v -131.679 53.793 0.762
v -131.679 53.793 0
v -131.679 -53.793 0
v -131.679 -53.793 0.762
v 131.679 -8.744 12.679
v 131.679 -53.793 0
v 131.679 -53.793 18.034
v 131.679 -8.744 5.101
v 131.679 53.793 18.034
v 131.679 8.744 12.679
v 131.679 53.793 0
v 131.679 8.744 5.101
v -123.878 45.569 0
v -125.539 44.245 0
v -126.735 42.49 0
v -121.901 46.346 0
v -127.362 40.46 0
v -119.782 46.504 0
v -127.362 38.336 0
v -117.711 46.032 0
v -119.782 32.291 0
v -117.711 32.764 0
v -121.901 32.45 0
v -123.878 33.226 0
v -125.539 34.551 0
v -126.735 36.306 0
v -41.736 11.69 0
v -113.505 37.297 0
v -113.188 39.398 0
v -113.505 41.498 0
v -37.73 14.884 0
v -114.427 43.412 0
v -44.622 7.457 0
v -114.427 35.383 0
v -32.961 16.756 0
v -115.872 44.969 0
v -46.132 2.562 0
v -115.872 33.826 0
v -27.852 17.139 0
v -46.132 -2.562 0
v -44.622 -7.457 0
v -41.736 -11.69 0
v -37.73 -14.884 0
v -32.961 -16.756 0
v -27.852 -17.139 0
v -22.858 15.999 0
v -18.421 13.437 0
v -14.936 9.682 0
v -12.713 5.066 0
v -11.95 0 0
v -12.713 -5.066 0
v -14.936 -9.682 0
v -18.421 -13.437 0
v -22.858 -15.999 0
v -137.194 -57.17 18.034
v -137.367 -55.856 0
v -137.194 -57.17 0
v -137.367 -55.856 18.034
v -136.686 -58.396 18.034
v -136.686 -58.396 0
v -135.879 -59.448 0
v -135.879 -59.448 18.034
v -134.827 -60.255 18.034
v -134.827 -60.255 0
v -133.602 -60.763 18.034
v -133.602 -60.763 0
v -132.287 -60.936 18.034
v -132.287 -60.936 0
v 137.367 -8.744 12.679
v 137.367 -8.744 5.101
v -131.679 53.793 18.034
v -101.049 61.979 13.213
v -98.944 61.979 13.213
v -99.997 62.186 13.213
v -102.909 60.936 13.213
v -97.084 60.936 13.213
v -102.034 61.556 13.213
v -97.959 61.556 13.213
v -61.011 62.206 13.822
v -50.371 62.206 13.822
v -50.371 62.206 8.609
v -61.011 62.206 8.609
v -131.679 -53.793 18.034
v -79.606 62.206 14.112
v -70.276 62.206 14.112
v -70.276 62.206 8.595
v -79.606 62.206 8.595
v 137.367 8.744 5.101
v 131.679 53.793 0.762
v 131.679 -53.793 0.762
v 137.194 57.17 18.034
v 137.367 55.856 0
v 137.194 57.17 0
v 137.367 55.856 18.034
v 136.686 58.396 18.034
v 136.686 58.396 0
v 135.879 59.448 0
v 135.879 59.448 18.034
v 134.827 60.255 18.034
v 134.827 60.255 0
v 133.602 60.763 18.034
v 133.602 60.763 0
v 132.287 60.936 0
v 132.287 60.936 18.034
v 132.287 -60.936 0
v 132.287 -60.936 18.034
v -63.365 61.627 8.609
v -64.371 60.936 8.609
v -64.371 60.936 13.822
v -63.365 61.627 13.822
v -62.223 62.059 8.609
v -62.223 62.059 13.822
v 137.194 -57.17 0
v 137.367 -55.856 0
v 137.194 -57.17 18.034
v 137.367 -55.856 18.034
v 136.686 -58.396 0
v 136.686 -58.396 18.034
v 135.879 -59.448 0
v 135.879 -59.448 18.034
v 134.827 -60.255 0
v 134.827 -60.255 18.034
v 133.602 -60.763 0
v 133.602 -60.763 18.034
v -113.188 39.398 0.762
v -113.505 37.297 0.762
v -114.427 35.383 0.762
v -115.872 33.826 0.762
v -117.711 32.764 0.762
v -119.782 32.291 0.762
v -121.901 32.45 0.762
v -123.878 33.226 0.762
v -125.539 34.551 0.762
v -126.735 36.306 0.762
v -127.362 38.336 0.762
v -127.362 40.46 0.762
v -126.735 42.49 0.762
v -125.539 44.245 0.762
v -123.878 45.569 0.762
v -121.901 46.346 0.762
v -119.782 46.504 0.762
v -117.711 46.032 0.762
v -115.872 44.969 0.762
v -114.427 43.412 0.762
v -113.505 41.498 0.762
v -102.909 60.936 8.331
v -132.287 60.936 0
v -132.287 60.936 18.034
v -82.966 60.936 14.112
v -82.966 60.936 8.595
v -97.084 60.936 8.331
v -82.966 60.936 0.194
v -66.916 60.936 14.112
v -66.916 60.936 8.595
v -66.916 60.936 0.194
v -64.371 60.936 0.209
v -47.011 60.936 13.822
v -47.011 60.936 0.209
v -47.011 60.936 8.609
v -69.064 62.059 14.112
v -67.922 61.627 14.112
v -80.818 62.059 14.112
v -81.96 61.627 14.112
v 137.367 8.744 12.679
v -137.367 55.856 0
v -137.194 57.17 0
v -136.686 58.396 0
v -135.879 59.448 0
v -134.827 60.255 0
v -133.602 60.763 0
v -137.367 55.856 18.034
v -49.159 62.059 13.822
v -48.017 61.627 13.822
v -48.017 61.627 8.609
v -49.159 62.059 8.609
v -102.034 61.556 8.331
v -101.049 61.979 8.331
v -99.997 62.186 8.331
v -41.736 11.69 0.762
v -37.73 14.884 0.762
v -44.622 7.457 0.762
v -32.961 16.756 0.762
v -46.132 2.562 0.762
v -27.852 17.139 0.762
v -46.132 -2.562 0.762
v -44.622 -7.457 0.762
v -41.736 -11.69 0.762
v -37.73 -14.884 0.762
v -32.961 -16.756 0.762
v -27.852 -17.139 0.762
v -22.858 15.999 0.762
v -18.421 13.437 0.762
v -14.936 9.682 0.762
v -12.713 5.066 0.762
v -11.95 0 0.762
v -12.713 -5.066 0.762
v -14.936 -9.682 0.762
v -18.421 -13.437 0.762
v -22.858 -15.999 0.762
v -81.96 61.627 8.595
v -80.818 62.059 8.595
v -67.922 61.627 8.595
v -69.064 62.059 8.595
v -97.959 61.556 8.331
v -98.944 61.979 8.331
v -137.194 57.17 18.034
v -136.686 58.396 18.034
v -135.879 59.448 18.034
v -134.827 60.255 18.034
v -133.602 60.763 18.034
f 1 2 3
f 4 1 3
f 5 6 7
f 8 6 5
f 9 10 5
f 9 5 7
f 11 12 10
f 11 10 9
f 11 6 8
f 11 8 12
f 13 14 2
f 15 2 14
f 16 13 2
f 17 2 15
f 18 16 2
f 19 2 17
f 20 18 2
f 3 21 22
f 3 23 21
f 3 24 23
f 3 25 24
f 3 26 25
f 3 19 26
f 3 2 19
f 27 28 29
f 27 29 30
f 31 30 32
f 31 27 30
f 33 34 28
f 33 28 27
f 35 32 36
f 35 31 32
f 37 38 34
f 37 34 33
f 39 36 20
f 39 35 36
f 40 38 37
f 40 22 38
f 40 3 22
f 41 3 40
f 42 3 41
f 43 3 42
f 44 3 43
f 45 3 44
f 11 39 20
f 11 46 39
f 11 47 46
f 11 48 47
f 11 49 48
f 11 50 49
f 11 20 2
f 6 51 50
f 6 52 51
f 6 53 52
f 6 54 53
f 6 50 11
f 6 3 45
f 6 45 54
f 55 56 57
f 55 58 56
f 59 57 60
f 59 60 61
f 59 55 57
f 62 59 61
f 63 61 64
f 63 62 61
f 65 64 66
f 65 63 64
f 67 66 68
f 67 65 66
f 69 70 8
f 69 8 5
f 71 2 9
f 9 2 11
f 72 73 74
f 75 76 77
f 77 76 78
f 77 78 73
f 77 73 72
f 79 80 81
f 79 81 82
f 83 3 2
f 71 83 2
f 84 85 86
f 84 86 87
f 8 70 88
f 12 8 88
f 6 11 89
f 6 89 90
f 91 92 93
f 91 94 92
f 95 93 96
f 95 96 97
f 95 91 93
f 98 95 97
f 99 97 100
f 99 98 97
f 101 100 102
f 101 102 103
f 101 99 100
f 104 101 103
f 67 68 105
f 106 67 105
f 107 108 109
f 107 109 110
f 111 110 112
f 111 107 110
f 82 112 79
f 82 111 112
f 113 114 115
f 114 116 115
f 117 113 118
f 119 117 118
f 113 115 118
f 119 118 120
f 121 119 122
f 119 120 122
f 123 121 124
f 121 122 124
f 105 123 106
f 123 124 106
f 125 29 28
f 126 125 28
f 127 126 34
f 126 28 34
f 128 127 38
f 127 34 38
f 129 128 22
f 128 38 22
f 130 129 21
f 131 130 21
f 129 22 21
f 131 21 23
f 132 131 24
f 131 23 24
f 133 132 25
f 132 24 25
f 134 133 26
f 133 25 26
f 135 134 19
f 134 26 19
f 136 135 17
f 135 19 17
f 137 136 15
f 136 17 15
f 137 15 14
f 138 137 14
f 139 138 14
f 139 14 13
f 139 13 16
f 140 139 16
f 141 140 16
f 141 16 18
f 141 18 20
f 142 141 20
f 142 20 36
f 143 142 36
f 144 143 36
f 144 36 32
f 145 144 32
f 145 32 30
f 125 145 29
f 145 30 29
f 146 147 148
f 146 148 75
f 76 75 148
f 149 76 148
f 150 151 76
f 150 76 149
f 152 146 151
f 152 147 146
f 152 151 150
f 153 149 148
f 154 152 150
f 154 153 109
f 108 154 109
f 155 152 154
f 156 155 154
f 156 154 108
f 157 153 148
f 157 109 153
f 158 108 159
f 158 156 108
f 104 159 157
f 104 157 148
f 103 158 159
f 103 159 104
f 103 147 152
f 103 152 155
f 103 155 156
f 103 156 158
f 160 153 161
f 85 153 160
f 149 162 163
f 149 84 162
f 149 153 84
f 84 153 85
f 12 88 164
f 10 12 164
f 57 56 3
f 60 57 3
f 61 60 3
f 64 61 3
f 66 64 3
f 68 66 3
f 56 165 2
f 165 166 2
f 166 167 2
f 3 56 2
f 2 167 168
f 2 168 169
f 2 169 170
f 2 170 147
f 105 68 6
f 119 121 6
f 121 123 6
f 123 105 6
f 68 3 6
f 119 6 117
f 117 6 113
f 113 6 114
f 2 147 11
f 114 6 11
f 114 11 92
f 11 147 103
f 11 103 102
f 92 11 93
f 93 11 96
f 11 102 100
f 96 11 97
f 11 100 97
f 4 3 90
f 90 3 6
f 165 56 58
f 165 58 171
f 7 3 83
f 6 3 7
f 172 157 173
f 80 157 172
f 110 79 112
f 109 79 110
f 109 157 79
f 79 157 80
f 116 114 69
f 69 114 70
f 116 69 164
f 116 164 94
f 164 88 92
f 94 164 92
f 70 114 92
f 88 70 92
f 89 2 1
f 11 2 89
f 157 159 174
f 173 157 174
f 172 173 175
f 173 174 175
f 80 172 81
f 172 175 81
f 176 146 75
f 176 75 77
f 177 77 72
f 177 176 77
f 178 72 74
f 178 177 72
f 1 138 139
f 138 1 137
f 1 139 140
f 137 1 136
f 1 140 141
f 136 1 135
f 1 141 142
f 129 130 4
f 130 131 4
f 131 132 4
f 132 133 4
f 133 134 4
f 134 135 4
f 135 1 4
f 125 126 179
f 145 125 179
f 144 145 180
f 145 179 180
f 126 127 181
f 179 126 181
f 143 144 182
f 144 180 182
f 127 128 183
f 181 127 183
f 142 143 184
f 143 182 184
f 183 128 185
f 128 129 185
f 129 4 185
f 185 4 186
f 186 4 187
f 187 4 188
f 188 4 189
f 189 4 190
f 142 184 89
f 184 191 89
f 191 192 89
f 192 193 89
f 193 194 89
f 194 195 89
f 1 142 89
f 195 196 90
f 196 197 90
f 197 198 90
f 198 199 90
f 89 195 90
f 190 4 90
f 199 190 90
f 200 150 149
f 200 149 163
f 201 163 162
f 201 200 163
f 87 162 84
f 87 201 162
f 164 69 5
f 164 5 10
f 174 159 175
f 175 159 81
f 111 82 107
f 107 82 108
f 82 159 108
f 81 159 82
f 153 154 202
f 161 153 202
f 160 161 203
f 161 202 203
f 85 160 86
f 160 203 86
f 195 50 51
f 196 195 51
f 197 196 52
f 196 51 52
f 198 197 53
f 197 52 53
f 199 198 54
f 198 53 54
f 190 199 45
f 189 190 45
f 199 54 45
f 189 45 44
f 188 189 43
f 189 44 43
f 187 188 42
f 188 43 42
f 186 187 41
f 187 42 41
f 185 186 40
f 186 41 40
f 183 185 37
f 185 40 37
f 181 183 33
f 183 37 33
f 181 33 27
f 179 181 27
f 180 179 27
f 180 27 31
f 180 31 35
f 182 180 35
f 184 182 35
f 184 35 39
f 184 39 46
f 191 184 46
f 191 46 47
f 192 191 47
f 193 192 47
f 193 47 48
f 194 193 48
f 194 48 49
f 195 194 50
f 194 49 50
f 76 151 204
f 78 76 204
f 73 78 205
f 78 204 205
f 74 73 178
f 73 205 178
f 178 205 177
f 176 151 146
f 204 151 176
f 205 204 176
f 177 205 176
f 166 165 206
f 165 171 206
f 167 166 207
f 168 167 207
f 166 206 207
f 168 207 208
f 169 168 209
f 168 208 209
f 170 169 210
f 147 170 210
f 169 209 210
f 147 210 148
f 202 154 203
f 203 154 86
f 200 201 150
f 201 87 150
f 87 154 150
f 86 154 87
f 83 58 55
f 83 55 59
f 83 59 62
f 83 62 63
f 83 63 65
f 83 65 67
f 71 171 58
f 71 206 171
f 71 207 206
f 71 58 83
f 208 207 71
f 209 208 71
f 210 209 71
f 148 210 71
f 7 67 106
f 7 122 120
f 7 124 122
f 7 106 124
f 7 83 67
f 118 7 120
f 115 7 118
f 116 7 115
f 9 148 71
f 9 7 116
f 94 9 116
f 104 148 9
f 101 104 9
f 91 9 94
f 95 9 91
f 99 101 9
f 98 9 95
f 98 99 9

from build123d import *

# Parameters (mm, degrees)
F0_W        = 274.7335731983
F0_H        = 121.8713819981
F0_W_2      = 263.3573412895
F0_H_2      = 107.5852587819
F1_DEPTH    = 18.034
F2_W        = 263.3573412895
F2_H        = 107.5852587819
F2_R        = 7.1263998647
F2_R_2      = 17.1869969205
F3_DEPTH    = 0.762
F4_W        = 17.4885261804
F4_H        = 7.5783608481
F5_DEPTH    = 25.4
F6_W        = 17.3600167036
F6_H        = 5.2121188492
F6_W_2      = 16.0498768091
F6_H_2      = 5.5174343288
F6_W_3      = 5.82498312
F6_H_3      = 4.8827342689
F7_DEPTH    = 1.27
F8_T1_DEPTH = 22.0126396744
F8_T3_DEPTH = 22.3179551541
F8_T5_DEPTH = 21.6832550942
F9_R        = 5.08
F11_DEPTH   = 151.384


# Not quite as in the source:
# - a fillet or chamfer that OpenCascade refuses, or shapes differently, is made with other operations: its cross-section is extruded or revolved along the edge and cut away or added


with BuildPart() as f1:
    # F0 (on Top) → F1 (new body)
    with BuildSketch(Plane.XY):
        Rectangle(F0_W, F0_H)
        Rectangle(F0_W_2, F0_H_2, mode=Mode.SUBTRACT)
    extrude(amount=F1_DEPTH)

    # F4 (on face) → F5 (cut)
    with BuildSketch(Plane.YZ.offset(137.3667865992)):
        with Locations((0, 8.890000172)):
            Rectangle(F4_W, F4_H)
    extrude(amount=-F5_DEPTH, mode=Mode.SUBTRACT)

    # F6 (on face) → F7 (join)
    with BuildSketch(Plane(origin=(0, 60.935690999, 0), x_dir=(-1, 0, 0), z_dir=(0, 1, 0))):
        with Locations((55.6909367442, 11.2154921517)):
            Rectangle(F6_W, F6_H)
        with Locations((74.9413147569, 11.3532179967)):
            Rectangle(F6_W_2, F6_H_2)
        with Locations((99.9967008829, 10.7720140368)):
            Rectangle(F6_W_3, F6_H_3)
    extrude(amount=F7_DEPTH)

    # F8: fillet of radius 5.08 on 6 edges, made by hand

    # F8_s2 → F8_t1 (cut)
    with BuildSketch(Plane.XY.offset(0.2091723145)):
        with BuildLine():
            ThreePointArc((-47.0109283924, 60.935690999), (-48.5749813332, 61.8775958802), (-50.3710325575, 62.205690999))
            Line((-50.3710325575, 62.205690999), (-47.0109283924, 62.205690999))
            Line((-47.0109283924, 62.205690999), (-47.0109283924, 60.935690999))
        make_face()
        with BuildLine():
            ThreePointArc((-64.370945096, 60.935690999), (-62.8068921552, 61.8775958802), (-61.010840931, 62.205690999))
            Line((-61.010840931, 62.205690999), (-64.370945096, 62.205690999))
            Line((-64.370945096, 62.205690999), (-64.370945096, 60.935690999))
        make_face()
    extrude(amount=F8_T1_DEPTH, mode=Mode.SUBTRACT)

    # F8_s4 → F8_t3 (cut)
    with BuildSketch(Plane.XY.offset(0.1942404196)):
        with BuildLine():
            ThreePointArc((-66.9163763523, 60.935690999), (-68.4804292931, 61.8775958802), (-70.2764805174, 62.205690999))
            Line((-70.2764805174, 62.205690999), (-66.9163763523, 62.205690999))
            Line((-66.9163763523, 62.205690999), (-66.9163763523, 60.935690999))
        make_face()
        with BuildLine():
            ThreePointArc((-82.9662531614, 60.935690999), (-81.4022002206, 61.8775958802), (-79.6061489964, 62.205690999))
            Line((-79.6061489964, 62.205690999), (-82.9662531614, 62.205690999))
            Line((-82.9662531614, 62.205690999), (-82.9662531614, 60.935690999))
        make_face()
    extrude(amount=F8_T3_DEPTH, mode=Mode.SUBTRACT)

    # F8_s6 → F8_t5 (cut)
    with BuildSketch(Plane.XY.offset(-0.0696135103)):
        with BuildLine():
            ThreePointArc((-102.9091924429, 60.935690999), (-101.3451395021, 61.8775958802), (-99.5490882778, 62.205690999))
            Line((-99.5490882778, 62.205690999), (-102.9091924429, 62.205690999))
            Line((-102.9091924429, 62.205690999), (-102.9091924429, 60.935690999))
        make_face()
        with BuildLine():
            ThreePointArc((-97.0842093229, 60.935690999), (-98.6482622638, 61.8775958802), (-100.444313488, 62.205690999))
            Line((-100.444313488, 62.205690999), (-97.0842093229, 62.205690999))
            Line((-97.0842093229, 62.205690999), (-97.0842093229, 60.935690999))
        make_face()
    extrude(amount=F8_T5_DEPTH, mode=Mode.SUBTRACT)

    # F9
    f9_edges = [f1.edges().sort_by_distance(p)[0] for p in [
        (-137.366787, 60.935691, 9.017),
        (137.366787, 60.935691, 9.017),
        (137.366787, -60.935691, 9.017),
        (-137.366787, -60.935691, 9.017),
    ]]
    fillet(f9_edges, radius=F9_R)

    # F10 (on face) → F11 (cut)
    with BuildSketch(Plane(origin=(0, 0, 0), x_dir=(1, 0, 0), z_dir=(0, 0, -1))):
        with BuildLine():
            ThreePointArc((-31.5201184515, 17.0209487763), (-31.5092102693, 17.2773055673), (-31.5055732342, 17.5338685513))
            ThreePointArc((-31.5055732342, 17.5338685513), (-45.7092261373, 24.9750704372), (-43.7409795354, 9.0615150012))
            ThreePointArc((-43.7409795354, 9.0615150012), (-38.5166685327, 14.4017738694), (-31.5201184515, 17.0209487763))
        make_face()
    extrude(amount=F11_DEPTH, mode=Mode.SUBTRACT)


with BuildPart() as f3:
    # F2 (on face) → F3 (new body)
    with BuildSketch(Plane(origin=(0, 0, 0), x_dir=(1, 0, 0), z_dir=(0, 0, -1))):
        Rectangle(F2_W, F2_H)
        with Locations((-120.3147396445, -39.3977835774)):
            Circle(F2_R, mode=Mode.SUBTRACT)
        with Locations((-29.1368085891, 0)):
            Circle(F2_R_2, mode=Mode.SUBTRACT)
    extrude(amount=-F3_DEPTH)


solid = Compound([f1.part, f3.part])
